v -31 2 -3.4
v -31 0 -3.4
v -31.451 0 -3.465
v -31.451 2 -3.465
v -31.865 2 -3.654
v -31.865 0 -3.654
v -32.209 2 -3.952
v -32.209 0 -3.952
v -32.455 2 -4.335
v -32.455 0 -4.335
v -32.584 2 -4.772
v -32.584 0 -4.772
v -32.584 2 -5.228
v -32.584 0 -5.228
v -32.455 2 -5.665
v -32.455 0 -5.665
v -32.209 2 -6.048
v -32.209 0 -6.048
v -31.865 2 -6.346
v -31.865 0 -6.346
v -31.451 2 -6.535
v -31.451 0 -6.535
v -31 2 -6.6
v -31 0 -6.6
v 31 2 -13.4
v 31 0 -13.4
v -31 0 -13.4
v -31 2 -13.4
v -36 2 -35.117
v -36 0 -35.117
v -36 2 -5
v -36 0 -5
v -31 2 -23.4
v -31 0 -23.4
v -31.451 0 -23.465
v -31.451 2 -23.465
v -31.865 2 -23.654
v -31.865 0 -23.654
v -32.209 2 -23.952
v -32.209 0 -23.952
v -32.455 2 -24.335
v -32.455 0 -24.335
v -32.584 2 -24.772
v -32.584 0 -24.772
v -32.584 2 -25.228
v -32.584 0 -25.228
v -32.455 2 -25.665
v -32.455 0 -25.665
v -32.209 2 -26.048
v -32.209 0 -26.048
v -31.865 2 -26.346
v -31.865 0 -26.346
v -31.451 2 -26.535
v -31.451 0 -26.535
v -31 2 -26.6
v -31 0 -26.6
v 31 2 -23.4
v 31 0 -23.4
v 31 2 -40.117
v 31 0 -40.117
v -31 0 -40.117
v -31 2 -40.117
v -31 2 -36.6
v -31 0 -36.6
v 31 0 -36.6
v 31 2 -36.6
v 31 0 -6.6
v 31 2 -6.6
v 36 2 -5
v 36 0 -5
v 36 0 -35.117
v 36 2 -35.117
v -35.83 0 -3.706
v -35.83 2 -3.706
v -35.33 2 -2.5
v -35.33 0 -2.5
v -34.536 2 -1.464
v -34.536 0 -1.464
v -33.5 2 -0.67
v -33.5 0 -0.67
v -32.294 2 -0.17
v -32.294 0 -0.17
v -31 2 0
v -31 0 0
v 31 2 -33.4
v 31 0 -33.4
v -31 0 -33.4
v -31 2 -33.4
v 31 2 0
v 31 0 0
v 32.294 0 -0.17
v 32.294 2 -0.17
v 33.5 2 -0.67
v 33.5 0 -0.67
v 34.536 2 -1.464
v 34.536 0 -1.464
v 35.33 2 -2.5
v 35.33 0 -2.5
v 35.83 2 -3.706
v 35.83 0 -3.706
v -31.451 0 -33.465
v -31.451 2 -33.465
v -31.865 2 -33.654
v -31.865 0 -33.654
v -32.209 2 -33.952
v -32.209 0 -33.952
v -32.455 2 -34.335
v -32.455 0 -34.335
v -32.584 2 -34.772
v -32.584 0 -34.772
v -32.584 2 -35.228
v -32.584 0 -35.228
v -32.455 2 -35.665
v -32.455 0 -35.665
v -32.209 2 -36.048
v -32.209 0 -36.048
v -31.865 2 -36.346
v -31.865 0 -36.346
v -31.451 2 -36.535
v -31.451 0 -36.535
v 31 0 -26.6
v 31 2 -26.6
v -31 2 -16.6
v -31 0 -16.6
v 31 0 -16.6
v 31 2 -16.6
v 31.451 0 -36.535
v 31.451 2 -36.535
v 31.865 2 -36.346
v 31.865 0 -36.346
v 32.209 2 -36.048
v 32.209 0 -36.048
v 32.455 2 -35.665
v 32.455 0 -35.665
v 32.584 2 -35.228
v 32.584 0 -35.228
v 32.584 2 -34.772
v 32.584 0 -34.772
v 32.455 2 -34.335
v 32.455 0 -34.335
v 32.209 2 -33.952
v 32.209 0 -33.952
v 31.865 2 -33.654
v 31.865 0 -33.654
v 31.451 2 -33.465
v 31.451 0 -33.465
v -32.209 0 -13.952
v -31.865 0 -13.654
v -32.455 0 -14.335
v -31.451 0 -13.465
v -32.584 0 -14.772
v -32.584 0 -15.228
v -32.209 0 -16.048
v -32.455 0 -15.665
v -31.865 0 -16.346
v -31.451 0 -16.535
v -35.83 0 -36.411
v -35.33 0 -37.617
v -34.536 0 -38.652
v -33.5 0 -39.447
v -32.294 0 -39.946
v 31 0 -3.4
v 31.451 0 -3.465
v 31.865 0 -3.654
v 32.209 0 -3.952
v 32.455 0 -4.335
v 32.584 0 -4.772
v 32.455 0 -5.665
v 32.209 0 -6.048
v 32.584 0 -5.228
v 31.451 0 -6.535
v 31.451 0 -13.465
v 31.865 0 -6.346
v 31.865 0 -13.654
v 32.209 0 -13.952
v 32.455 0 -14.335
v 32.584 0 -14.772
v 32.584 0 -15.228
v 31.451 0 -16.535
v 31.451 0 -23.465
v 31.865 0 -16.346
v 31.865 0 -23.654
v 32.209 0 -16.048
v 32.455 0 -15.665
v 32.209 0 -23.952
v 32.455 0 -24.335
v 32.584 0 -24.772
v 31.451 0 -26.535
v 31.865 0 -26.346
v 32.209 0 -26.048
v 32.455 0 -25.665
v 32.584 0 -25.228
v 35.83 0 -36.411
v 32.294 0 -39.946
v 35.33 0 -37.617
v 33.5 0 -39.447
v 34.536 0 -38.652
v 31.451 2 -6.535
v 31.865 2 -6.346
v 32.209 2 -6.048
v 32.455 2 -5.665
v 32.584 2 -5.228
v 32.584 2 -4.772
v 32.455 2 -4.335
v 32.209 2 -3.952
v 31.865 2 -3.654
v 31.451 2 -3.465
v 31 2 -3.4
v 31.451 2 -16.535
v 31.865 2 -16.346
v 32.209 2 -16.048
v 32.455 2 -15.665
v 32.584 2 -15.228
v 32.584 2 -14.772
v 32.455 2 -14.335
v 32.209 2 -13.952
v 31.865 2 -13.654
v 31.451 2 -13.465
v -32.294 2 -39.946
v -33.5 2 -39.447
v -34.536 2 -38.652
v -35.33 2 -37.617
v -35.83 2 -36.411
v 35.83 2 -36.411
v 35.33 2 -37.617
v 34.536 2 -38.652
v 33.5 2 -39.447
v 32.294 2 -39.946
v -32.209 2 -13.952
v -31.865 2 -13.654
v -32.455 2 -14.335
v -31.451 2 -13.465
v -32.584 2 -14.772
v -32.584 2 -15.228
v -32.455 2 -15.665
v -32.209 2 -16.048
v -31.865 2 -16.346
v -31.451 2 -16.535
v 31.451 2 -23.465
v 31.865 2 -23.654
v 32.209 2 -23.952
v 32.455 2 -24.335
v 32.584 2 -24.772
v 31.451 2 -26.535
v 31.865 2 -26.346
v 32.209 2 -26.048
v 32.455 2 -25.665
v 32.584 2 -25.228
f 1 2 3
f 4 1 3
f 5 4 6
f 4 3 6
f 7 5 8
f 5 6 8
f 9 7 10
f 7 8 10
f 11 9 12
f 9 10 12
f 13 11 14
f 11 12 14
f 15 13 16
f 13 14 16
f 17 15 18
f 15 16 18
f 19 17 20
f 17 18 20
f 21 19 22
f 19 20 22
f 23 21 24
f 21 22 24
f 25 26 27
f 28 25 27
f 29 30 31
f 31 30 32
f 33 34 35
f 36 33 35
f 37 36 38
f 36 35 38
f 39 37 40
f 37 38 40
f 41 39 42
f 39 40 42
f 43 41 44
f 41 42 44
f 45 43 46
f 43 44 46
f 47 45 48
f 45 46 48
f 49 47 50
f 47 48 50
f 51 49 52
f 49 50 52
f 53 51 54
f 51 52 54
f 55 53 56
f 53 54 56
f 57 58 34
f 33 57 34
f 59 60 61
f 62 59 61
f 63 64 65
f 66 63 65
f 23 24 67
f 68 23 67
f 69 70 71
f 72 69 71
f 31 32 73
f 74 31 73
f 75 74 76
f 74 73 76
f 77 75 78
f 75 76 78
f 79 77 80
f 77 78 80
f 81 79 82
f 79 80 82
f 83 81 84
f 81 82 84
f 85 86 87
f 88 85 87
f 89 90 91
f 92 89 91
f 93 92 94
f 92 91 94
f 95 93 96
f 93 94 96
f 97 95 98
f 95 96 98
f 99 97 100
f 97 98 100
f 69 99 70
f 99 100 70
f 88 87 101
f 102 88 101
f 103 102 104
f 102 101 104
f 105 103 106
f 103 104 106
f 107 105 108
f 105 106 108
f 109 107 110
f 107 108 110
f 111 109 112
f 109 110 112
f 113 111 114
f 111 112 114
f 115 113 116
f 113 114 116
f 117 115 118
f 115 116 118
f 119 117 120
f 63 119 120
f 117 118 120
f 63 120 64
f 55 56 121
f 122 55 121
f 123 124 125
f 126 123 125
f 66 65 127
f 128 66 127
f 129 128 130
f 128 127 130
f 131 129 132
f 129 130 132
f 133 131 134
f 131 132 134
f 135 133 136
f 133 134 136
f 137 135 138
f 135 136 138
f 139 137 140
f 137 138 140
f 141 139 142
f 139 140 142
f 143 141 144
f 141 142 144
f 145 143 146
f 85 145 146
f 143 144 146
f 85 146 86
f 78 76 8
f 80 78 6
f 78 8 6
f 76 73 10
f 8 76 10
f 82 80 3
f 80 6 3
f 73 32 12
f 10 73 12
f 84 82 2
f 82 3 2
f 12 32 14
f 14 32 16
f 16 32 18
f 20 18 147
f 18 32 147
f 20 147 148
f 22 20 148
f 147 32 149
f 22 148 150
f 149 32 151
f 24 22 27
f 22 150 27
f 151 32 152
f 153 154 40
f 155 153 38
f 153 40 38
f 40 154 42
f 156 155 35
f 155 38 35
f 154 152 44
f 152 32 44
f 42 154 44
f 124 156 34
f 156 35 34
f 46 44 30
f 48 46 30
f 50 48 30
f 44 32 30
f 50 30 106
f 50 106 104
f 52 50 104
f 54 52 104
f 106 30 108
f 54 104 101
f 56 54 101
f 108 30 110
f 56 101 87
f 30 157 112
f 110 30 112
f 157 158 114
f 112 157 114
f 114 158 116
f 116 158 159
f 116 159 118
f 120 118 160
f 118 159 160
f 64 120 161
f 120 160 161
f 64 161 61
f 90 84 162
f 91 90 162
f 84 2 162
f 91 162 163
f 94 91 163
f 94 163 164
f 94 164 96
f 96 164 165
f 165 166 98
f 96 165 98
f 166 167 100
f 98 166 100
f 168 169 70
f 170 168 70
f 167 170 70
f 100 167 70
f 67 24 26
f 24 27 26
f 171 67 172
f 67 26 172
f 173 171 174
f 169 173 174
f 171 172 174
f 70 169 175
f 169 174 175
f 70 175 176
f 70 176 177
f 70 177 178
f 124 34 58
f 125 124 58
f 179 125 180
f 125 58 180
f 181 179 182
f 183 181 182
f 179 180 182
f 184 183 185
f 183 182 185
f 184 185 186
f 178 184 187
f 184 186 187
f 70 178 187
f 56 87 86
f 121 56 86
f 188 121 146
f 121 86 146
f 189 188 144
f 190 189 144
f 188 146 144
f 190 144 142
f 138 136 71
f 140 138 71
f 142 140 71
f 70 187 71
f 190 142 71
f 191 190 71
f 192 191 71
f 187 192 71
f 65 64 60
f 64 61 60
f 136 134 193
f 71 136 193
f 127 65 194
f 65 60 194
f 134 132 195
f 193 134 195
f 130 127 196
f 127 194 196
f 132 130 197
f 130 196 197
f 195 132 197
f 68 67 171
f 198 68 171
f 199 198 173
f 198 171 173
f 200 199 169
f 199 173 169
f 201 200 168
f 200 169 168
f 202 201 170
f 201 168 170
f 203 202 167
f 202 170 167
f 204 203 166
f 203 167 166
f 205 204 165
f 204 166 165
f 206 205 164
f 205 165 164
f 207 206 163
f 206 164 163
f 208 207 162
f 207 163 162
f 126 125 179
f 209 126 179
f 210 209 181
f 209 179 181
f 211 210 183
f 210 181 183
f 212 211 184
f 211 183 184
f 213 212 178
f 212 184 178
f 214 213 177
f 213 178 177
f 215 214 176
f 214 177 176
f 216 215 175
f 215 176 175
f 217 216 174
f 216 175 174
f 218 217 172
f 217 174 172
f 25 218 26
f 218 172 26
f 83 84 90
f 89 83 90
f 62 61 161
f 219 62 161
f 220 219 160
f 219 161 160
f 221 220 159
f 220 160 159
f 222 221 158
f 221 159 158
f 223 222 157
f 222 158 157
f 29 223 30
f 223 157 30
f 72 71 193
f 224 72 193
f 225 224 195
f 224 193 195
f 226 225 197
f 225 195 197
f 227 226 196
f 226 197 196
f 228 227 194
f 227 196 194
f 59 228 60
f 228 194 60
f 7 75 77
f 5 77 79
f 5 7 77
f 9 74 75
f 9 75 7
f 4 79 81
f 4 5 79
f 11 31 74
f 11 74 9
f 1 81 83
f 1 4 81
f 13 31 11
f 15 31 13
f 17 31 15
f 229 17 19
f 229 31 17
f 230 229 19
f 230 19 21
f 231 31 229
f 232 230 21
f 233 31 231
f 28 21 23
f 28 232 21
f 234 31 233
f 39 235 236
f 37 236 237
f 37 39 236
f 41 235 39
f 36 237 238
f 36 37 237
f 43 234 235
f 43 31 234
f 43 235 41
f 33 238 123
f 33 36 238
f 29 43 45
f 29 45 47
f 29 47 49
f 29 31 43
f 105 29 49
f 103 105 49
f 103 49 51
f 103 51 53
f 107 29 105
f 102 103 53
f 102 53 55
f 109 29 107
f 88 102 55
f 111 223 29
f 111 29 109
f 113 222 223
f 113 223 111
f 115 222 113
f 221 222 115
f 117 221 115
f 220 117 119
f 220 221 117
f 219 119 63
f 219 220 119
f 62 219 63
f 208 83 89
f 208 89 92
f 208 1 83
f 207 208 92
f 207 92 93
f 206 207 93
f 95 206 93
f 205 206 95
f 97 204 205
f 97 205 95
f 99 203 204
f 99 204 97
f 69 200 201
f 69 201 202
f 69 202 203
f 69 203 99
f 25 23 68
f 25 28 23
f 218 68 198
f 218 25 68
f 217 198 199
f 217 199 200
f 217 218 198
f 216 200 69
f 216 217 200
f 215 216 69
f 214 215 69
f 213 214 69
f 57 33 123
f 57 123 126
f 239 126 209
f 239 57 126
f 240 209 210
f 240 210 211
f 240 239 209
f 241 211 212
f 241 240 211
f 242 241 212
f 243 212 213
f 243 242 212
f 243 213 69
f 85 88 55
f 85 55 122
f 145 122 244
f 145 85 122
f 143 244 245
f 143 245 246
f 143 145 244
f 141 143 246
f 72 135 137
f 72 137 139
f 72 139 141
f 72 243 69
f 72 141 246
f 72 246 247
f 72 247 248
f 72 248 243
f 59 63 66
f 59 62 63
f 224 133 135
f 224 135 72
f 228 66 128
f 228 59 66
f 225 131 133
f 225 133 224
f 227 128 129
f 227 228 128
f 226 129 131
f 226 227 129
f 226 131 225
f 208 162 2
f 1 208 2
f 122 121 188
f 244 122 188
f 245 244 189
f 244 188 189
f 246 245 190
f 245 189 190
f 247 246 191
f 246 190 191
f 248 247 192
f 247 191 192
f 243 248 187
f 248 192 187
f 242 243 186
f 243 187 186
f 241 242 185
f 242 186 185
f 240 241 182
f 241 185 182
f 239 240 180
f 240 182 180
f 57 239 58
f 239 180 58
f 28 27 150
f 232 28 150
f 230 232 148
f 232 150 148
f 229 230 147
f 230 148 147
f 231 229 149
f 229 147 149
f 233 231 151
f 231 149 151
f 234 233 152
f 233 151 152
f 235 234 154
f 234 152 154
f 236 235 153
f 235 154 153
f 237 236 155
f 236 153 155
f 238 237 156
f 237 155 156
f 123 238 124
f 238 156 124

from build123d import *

# Parameters (mm, degrees)
EXTRUDE_1_DEPTH = 2


with BuildPart() as part:
    # 草图1 → 凸台-拉伸1 (new body)
    with BuildSketch(Plane(origin=(0, 0, 0), x_dir=(1, 0, 0), z_dir=(0, 1, 0))):
        with BuildLine():
            Line((31, 40.116685184), (-31, 40.116685184))
            ThreePointArc((-31, 40.116685184), (-34.535533906, 38.652219089), (-36, 35.116685184))
            Line((-36, 35.116685184), (-36, 5))
            ThreePointArc((-36, 5), (-34.535533906, 1.464466094), (-31, 0))
            Line((-31, 0), (31, 0))
            ThreePointArc((31, 0), (34.535533906, 1.464466094), (36, 5))
            Line((36, 5), (36, 35.116685184))
            ThreePointArc((36, 35.116685184), (34.535533906, 38.652219089), (31, 40.116685184))
        make_face()
        with BuildLine():
            Line((-31, 6.6), (0, 6.6))
            Line((0, 6.6), (31, 6.6))
            ThreePointArc((31, 6.6), (32.6, 5), (31, 3.4))
            Line((31, 3.4), (0, 3.4))
            Line((0, 3.4), (-31, 3.4))
            ThreePointArc((-31, 3.4), (-32.6, 5), (-31, 6.6))
        make_face(mode=Mode.SUBTRACT)
        with BuildLine():
            Line((-31, 16.6), (0, 16.6))
            Line((0, 16.6), (31, 16.6))
            ThreePointArc((31, 16.6), (32.6, 15), (31, 13.4))
            Line((31, 13.4), (0, 13.4))
            Line((0, 13.4), (-31, 13.4))
            ThreePointArc((-31, 13.4), (-32.6, 15), (-31, 16.6))
        make_face(mode=Mode.SUBTRACT)
        with BuildLine():
            Line((-31, 26.6), (0, 26.6))
            Line((0, 26.6), (31, 26.6))
            ThreePointArc((31, 26.6), (32.6, 25), (31, 23.4))
            Line((31, 23.4), (0, 23.4))
            Line((0, 23.4), (-31, 23.4))
            ThreePointArc((-31, 23.4), (-32.6, 25), (-31, 26.6))
        make_face(mode=Mode.SUBTRACT)
        with BuildLine():
            Line((-31, 36.6), (0, 36.6))
            Line((0, 36.6), (31, 36.6))
            ThreePointArc((31, 36.6), (32.6, 35), (31, 33.4))
            Line((31, 33.4), (0, 33.4))
            Line((0, 33.4), (-31, 33.4))
            ThreePointArc((-31, 33.4), (-32.6, 35), (-31, 36.6))
        make_face(mode=Mode.SUBTRACT)
    extrude(amount=EXTRUDE_1_DEPTH)


solid = part.part
